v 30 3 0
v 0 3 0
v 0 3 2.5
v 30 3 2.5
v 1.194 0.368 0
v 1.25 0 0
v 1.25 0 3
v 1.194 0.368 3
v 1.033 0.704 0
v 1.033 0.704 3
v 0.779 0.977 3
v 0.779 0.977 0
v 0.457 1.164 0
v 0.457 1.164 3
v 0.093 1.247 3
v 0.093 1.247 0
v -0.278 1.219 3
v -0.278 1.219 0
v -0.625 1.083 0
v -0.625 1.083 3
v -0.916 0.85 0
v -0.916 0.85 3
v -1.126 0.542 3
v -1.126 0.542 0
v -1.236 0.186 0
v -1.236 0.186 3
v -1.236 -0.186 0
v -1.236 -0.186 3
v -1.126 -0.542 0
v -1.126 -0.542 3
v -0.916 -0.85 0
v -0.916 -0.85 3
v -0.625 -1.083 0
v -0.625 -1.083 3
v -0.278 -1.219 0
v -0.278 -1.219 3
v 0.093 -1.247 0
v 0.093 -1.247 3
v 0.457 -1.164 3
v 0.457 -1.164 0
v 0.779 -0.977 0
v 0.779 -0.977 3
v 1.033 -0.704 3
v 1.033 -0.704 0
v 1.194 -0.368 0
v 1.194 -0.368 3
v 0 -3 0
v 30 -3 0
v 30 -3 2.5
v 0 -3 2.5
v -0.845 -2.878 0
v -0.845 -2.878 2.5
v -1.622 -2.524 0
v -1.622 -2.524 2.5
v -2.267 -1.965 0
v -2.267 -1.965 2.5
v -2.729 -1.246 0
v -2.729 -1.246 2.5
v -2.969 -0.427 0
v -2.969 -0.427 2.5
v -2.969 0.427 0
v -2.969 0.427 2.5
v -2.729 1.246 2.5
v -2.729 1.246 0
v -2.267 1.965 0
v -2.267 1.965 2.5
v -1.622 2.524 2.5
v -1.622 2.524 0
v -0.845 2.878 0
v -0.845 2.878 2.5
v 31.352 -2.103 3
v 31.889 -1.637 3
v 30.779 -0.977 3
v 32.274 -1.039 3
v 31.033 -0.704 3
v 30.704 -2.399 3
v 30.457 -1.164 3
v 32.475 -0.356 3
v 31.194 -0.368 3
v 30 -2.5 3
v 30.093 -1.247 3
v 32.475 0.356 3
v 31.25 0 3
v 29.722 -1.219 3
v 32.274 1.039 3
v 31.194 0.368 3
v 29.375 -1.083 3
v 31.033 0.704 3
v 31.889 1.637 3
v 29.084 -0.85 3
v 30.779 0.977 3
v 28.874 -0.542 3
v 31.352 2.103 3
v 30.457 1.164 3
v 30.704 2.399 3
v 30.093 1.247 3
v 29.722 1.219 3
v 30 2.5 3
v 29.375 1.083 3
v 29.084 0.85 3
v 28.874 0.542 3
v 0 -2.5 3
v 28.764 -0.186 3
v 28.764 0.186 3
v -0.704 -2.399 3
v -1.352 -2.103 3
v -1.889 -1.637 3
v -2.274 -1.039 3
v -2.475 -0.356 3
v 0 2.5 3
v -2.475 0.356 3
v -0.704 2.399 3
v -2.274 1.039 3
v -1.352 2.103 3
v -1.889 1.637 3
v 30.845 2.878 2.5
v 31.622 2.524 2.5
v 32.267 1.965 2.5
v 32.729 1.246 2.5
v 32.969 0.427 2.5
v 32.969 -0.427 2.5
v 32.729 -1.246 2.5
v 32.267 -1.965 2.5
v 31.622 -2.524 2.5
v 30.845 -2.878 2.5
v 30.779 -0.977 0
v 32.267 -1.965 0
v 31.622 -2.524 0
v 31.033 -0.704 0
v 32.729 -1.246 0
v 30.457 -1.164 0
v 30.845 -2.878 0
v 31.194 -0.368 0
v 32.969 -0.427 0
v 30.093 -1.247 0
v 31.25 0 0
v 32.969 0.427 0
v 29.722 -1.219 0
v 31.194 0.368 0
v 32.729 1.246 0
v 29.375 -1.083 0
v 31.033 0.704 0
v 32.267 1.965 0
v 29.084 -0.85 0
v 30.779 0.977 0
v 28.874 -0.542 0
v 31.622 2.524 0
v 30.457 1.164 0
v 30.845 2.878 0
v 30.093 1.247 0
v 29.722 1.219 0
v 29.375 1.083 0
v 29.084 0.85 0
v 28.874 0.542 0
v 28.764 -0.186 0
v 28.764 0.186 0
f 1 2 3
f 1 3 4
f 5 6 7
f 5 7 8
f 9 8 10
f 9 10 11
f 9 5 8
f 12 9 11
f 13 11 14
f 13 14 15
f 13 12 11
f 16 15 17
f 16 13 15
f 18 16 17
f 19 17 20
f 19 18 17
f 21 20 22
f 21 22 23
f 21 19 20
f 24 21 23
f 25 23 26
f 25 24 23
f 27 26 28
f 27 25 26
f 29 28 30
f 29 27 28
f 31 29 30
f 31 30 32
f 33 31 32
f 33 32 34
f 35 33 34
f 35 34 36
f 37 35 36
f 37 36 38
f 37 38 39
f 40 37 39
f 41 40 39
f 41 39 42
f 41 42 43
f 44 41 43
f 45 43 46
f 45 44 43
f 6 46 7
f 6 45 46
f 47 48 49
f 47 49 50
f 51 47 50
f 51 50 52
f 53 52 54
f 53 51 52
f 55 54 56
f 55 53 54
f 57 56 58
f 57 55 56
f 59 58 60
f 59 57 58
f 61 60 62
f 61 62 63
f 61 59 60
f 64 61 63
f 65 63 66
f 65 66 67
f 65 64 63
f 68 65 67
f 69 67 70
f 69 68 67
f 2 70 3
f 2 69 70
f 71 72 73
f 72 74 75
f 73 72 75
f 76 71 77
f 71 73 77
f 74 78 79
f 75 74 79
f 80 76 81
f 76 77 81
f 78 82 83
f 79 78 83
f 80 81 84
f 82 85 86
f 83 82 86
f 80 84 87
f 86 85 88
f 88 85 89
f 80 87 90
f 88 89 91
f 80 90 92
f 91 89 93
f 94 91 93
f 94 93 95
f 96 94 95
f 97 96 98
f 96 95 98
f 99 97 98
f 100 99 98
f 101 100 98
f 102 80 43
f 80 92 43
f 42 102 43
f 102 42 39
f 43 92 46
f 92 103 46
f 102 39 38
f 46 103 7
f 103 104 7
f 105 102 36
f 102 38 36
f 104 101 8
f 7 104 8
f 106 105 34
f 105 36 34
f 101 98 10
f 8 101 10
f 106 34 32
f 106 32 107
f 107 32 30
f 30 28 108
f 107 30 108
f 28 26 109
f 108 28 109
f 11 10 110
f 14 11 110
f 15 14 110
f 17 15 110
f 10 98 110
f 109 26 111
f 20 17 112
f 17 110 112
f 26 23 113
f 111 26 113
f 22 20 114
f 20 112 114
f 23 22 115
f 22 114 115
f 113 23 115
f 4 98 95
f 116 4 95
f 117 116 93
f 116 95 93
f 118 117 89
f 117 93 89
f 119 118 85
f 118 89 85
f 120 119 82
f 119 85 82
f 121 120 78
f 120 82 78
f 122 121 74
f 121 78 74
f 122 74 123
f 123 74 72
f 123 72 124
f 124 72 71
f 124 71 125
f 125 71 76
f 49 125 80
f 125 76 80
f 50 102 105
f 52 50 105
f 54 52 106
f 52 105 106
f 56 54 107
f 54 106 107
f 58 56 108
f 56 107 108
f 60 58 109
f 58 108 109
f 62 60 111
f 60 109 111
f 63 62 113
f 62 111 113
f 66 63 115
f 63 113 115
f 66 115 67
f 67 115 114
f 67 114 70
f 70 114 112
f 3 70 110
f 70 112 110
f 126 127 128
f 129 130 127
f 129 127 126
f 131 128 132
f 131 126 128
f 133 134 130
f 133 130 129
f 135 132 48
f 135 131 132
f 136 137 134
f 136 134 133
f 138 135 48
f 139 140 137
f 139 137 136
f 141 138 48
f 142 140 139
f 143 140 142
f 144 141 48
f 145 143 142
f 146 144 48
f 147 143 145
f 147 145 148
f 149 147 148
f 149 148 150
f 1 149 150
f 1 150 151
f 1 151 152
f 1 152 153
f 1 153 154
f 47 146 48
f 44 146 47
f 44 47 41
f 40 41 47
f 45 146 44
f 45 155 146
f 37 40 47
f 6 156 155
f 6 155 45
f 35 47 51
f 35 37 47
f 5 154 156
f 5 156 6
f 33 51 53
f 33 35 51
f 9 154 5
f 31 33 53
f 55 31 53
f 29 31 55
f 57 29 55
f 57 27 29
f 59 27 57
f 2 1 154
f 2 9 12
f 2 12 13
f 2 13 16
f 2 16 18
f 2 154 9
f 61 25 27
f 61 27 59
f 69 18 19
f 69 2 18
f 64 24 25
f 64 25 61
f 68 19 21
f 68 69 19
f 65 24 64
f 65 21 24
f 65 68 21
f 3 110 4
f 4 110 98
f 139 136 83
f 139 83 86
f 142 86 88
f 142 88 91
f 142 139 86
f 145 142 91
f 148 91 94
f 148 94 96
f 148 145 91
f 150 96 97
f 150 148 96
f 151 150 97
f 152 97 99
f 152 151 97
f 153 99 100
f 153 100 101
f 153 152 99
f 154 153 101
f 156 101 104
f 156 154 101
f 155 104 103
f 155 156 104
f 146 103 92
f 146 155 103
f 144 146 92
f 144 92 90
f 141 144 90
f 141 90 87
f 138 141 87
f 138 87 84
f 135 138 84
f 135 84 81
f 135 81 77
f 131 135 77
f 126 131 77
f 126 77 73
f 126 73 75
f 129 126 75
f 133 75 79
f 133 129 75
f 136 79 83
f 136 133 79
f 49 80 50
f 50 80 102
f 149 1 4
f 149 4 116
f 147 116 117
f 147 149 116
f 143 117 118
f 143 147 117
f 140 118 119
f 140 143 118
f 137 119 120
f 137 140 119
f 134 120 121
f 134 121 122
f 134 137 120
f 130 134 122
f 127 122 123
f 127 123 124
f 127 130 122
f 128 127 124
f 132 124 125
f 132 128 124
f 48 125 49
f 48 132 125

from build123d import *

# Parameters (mm, degrees)
CROQUIS1_R              = 1.25
SALIENTE_EXTRUIR1_DEPTH = 3
CHAFL_N1_SIZE           = 0.5


with BuildPart() as part:
    # Croquis1 → Saliente-Extruir1 (new body)
    with BuildSketch(Plane.XY):
        with BuildLine():
            Line((0, 3), (30, 3))
            ThreePointArc((30, 3), (33, 0), (30, -3))
            Line((30, -3), (0, -3))
            ThreePointArc((0, -3), (-3, 0), (0, 3))
        make_face()
        with Locations((30, 0)):
            Circle(CROQUIS1_R, mode=Mode.SUBTRACT)
        Circle(CROQUIS1_R, mode=Mode.SUBTRACT)
    extrude(amount=SALIENTE_EXTRUIR1_DEPTH)

    # Chaflán1
    chafl_n1_edges = [part.edges().sort_by_distance(p)[0] for p in [
        (33, 0, 3),
        (15, 3, 3),
        (-3, 0, 3),
        (15, -3, 3),
    ]]
    chamfer(chafl_n1_edges, length=CHAFL_N1_SIZE)


solid = part.part
